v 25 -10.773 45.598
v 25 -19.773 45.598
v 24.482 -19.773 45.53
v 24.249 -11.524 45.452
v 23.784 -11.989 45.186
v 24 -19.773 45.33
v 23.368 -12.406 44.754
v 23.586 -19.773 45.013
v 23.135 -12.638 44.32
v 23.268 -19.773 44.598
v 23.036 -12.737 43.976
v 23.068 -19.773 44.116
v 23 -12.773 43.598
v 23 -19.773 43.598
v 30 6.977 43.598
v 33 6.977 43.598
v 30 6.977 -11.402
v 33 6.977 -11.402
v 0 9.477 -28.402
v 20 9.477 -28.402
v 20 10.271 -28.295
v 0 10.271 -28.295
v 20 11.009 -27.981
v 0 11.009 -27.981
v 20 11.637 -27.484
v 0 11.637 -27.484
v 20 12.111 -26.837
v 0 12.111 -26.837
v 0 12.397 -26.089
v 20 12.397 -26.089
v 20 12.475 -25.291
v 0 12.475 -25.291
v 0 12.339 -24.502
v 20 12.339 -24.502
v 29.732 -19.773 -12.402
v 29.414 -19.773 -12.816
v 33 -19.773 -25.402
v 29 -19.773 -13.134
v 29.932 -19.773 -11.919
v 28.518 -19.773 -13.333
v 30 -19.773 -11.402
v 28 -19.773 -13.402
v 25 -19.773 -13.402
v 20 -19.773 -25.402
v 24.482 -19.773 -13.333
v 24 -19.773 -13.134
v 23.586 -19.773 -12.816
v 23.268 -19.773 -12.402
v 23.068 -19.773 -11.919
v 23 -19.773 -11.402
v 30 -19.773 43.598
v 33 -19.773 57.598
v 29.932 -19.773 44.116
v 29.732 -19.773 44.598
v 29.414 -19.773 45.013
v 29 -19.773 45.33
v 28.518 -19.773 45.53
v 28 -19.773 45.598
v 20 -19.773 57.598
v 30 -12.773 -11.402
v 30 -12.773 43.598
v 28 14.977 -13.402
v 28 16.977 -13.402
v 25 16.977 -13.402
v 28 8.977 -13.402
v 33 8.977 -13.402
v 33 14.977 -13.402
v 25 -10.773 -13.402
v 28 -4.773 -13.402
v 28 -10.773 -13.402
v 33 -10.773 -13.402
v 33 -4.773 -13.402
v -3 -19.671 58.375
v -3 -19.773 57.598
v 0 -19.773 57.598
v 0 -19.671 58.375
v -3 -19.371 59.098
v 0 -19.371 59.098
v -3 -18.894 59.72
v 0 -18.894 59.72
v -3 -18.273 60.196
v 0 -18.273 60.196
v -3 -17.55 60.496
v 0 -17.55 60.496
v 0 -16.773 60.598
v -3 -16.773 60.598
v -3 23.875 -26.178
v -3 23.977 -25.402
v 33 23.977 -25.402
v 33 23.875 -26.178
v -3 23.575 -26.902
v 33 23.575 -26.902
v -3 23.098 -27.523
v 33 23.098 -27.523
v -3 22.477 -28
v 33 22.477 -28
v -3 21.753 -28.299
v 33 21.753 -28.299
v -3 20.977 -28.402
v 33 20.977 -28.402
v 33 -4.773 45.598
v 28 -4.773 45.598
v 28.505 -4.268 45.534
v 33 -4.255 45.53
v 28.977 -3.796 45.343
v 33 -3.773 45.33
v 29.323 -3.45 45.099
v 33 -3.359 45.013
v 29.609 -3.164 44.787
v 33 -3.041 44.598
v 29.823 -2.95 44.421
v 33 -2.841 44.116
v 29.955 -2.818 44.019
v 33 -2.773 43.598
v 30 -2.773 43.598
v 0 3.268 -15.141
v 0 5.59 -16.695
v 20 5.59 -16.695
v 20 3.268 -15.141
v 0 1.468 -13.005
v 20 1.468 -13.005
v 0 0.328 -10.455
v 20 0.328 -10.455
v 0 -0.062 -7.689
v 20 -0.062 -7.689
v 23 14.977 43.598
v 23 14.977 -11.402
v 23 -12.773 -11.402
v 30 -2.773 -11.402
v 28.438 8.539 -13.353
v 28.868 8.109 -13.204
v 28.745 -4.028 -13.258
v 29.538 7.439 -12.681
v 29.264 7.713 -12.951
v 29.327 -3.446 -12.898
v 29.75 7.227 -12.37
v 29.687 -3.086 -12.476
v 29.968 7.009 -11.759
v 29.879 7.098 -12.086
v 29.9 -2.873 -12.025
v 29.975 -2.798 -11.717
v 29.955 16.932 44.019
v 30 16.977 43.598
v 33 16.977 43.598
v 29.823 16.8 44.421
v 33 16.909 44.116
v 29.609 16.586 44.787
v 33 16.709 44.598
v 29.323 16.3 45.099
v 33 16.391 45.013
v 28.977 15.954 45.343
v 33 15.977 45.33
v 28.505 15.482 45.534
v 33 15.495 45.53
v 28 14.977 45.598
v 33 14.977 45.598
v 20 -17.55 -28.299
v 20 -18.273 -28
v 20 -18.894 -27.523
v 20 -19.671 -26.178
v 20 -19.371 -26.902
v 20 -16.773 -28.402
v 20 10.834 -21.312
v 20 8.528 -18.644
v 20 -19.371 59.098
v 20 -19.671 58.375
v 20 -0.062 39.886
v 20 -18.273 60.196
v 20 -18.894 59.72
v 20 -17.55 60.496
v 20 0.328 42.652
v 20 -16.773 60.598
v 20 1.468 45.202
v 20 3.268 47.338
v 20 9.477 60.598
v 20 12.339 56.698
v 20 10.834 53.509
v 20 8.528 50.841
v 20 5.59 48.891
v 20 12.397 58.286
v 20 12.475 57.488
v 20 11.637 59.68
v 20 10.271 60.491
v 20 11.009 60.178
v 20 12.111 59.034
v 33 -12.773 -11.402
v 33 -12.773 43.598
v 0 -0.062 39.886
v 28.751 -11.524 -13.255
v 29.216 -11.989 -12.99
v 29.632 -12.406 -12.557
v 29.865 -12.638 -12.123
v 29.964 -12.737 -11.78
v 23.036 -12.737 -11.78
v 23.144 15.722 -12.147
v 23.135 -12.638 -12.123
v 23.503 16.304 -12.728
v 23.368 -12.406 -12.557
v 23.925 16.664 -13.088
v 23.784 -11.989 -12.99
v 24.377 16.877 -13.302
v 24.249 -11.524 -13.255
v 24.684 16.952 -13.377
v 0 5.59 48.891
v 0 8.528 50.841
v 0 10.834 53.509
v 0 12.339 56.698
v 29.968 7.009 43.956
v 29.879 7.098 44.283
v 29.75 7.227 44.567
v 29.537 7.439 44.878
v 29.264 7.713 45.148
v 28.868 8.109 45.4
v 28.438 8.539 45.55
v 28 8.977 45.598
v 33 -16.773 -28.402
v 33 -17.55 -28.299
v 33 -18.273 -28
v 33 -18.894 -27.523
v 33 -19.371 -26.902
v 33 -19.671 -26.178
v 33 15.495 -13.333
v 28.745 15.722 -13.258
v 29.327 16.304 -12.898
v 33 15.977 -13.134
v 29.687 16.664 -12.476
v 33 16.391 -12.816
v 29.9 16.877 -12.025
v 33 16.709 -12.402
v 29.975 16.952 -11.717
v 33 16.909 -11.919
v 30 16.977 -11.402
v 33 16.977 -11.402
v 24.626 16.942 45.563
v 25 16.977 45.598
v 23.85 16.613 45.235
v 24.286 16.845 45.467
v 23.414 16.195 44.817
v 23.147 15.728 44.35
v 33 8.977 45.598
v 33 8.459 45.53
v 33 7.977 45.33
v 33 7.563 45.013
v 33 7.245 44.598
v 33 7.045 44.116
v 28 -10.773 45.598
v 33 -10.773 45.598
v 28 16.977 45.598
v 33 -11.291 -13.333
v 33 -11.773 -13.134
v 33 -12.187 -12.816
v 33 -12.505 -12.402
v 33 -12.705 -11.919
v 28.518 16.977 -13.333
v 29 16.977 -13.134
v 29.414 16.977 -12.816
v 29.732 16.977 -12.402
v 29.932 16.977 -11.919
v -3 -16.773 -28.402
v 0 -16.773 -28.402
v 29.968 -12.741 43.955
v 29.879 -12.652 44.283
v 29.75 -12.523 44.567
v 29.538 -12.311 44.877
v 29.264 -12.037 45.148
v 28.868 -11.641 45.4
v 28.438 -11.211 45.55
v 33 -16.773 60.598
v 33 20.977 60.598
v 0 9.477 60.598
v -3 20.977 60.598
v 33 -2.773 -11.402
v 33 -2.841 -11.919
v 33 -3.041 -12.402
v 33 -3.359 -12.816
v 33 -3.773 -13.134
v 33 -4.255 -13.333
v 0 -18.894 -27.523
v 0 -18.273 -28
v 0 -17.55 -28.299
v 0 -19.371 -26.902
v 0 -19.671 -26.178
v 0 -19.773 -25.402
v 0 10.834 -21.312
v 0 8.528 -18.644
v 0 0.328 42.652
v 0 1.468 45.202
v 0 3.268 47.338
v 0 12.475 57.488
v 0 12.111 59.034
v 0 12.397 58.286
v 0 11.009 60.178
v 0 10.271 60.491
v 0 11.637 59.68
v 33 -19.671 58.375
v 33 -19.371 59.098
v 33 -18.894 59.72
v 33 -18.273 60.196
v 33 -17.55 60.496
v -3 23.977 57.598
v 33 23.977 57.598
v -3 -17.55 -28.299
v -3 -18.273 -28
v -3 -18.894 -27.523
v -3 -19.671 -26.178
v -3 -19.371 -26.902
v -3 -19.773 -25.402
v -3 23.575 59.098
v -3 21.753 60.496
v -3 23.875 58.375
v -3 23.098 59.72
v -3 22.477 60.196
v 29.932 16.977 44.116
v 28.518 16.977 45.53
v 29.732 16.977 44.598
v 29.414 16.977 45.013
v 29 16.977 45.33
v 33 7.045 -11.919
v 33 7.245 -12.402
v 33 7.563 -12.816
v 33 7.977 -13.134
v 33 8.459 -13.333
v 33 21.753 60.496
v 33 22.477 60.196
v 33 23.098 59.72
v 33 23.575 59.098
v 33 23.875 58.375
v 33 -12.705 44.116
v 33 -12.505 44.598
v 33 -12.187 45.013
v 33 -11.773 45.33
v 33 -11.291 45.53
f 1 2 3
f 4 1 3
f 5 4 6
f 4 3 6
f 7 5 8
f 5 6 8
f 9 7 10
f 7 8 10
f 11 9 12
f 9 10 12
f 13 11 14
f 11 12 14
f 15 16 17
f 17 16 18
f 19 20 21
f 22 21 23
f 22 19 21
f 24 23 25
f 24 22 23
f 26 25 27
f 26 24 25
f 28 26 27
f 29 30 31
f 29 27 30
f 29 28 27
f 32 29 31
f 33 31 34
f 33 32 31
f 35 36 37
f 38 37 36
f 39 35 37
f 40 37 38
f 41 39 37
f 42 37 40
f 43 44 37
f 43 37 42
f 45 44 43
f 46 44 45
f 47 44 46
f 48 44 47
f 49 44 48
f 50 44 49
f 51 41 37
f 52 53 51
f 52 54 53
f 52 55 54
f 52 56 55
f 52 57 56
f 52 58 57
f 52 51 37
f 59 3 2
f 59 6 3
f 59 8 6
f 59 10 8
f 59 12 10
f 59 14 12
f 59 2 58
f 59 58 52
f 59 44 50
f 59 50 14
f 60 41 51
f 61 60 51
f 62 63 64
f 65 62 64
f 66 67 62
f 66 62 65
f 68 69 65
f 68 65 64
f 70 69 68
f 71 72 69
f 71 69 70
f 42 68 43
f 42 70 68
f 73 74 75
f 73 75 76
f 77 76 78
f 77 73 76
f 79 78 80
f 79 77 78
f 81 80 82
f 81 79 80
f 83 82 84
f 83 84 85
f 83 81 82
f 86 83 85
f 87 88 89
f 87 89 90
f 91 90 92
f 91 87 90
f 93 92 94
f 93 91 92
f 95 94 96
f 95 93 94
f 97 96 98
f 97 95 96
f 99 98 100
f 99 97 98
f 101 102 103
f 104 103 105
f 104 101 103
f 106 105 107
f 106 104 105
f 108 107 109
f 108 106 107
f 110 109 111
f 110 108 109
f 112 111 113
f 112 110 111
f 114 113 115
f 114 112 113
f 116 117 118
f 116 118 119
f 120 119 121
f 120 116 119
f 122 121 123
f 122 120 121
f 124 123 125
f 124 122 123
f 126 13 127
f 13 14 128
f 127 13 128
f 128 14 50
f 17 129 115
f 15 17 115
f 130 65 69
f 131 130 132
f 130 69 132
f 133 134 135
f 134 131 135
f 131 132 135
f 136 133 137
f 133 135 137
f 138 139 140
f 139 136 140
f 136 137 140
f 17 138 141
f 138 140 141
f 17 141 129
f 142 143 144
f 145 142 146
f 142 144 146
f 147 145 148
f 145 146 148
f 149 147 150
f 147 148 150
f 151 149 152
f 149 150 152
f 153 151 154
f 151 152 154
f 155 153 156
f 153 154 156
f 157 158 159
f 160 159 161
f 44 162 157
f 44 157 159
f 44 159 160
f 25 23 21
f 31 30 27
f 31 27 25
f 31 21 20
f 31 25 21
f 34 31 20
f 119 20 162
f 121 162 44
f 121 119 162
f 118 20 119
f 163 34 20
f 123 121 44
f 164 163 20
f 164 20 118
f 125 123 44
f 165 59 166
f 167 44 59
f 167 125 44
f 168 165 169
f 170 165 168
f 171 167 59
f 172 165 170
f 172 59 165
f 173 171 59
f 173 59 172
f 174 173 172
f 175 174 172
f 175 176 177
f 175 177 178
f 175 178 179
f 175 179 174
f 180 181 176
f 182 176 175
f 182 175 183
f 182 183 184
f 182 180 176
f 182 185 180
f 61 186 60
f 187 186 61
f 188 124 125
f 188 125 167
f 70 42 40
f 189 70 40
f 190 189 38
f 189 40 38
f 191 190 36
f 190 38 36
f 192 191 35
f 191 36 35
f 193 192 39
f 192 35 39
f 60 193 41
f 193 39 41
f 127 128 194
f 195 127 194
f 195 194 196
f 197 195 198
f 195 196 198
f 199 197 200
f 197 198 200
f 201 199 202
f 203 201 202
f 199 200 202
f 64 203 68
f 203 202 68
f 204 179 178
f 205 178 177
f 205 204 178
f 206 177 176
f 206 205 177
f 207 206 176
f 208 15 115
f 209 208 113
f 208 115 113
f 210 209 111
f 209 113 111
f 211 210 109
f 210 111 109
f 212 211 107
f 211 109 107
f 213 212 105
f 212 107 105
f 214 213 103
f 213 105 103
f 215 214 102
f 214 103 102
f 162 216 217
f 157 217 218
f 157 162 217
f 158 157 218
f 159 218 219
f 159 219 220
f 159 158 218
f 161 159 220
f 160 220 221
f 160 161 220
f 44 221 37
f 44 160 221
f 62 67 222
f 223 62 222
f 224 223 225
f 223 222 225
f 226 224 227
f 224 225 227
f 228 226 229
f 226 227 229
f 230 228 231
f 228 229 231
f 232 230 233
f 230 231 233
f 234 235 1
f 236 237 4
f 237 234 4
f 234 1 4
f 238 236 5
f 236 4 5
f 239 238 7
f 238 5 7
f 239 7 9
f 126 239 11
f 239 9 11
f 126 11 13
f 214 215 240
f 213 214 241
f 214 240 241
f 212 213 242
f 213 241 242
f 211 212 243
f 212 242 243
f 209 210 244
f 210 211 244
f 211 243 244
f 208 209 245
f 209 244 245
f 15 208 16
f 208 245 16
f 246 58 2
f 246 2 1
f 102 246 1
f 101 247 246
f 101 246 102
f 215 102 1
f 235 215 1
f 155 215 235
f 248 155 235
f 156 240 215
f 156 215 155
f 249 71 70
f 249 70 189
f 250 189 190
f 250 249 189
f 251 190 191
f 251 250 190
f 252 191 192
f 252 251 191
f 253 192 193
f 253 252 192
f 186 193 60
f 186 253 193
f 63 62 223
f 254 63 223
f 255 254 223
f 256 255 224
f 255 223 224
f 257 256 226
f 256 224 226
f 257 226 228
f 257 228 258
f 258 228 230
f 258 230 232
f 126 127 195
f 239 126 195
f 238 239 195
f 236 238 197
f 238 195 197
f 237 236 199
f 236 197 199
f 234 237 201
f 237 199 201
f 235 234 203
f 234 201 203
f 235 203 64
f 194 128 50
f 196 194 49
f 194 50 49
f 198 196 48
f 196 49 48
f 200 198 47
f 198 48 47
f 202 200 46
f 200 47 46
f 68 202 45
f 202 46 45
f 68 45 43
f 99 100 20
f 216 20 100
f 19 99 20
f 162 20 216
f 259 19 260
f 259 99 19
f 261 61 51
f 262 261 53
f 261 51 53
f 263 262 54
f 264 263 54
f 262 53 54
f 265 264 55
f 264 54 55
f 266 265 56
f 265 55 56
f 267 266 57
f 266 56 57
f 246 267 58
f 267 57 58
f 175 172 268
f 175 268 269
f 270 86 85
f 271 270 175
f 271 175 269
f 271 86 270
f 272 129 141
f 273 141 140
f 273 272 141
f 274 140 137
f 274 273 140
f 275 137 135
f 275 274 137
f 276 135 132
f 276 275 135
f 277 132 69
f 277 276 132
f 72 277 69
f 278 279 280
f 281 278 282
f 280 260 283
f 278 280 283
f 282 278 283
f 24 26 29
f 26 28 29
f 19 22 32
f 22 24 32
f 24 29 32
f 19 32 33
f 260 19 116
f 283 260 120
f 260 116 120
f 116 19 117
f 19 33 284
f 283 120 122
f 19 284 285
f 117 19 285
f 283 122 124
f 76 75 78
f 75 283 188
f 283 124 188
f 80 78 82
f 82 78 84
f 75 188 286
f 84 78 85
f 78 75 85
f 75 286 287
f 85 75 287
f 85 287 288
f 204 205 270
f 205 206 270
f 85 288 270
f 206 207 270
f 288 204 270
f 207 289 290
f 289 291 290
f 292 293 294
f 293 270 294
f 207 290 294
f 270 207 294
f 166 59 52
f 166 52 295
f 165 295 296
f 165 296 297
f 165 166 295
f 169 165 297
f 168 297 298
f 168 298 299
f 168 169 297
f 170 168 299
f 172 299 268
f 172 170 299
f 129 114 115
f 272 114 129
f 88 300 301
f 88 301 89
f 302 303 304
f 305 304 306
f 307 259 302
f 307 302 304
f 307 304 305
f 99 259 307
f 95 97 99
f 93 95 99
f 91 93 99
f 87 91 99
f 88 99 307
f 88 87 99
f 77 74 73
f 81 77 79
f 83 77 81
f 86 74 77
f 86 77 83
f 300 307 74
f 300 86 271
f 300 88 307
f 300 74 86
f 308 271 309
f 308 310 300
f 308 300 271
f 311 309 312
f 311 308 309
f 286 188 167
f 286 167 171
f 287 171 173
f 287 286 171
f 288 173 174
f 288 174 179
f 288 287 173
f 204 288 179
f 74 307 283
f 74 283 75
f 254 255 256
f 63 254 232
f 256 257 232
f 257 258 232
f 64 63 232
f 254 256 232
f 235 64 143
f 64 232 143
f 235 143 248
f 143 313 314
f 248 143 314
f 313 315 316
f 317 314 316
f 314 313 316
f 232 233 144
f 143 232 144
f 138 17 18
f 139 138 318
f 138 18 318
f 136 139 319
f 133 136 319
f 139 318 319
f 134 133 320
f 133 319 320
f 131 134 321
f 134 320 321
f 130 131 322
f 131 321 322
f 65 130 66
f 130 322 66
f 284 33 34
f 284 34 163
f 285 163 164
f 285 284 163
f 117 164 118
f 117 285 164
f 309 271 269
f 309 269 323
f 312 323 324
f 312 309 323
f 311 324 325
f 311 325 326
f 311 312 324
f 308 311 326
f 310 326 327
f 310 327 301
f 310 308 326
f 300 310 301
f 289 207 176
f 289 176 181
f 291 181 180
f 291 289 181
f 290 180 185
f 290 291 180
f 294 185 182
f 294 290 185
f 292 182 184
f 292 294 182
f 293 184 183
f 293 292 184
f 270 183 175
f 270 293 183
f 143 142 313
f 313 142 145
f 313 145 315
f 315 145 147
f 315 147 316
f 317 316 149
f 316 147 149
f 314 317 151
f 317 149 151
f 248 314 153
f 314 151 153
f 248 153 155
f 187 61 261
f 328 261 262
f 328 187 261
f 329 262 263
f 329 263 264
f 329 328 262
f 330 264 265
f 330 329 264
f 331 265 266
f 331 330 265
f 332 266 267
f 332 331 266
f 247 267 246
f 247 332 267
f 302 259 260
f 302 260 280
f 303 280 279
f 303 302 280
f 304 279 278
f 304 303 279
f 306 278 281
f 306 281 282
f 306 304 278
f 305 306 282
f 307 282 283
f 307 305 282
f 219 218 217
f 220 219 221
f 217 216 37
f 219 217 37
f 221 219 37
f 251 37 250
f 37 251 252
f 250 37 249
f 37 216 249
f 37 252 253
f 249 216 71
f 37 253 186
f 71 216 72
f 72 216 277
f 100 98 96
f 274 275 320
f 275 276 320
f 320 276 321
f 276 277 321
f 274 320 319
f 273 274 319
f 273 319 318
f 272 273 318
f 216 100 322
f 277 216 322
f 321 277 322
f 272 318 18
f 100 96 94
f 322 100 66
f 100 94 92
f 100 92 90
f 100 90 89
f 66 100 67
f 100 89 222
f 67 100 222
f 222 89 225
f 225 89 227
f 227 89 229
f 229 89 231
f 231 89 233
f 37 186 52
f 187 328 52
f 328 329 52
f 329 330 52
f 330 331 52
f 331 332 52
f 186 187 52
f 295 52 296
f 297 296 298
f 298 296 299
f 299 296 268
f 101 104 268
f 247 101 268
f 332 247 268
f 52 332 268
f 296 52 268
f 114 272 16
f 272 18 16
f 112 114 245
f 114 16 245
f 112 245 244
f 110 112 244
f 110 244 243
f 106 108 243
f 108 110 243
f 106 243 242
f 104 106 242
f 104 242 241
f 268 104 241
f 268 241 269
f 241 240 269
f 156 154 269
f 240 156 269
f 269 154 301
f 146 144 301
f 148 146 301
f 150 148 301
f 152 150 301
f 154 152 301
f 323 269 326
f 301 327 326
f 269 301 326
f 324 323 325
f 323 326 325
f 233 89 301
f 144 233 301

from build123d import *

# Parameters (mm, degrees)
RESSALTO_EXTRUS_O2_DEPTH      = 30
RESSALTO_EXTRUS_O3_START      = 3
RESSALTO_EXTRUS_O3_DEPTH      = 3
RESSALTO_EXTRUS_O4_DEPTH      = 3
RESSALTO_EXTRUS_O4_DEPTH_BACK = 10
CORTE_EXTRUS_O1_DEPTH         = 10
CORTE_EXTRUS_O2_REACH         = 83.702
FILETE1_START                 = -19.773073923
FILETE1_DEPTH                 = 36.75
FILETE1_START_2               = -13.40159992
FILETE1_2_DEPTH               = 59


with BuildPart() as part:
    # Esboço2 → Ressalto-extrusão2 (new body)
    with BuildSketch(Plane(origin=(0, 0, 0), x_dir=(0, 0, -1), z_dir=(1, 0, 0))):
        with BuildLine():
            Line((2.90159992, -0.062465938), (-35.09840008, -0.062465938))
            Line((-35.09840008, -0.062465938), (-39.886084903, -0.062465938))
            ThreePointArc((-39.886084903, -0.062465938), (-45.202180234, 1.467638524), (-48.891439328, 5.589707975))
            ThreePointArc((-48.891439328, 5.589707975), (-52.096536948, 9.772081499), (-56.69840008, 12.338743681))
            ThreePointArc((-56.69840008, 12.338743681), (-59.373224015, 11.895603401), (-60.59840008, 9.476926077))
            Line((-60.59840008, 9.476926077), (-60.59840008, 20.976926077))
            ThreePointArc((-60.59840008, 20.976926077), (-59.719720424, 23.09824642), (-57.59840008, 23.976926077))
            Line((-57.59840008, 23.976926077), (25.40159992, 23.976926077))
            ThreePointArc((25.40159992, 23.976926077), (27.522920263, 23.09824642), (28.40159992, 20.976926077))
            Line((28.40159992, 20.976926077), (28.40159992, 9.476926077))
            ThreePointArc((28.40159992, 9.476926077), (27.176423855, 11.895603401), (24.50159992, 12.338743681))
            ThreePointArc((24.50159992, 12.338743681), (19.899736788, 9.772081499), (16.694639168, 5.589707975))
            ThreePointArc((16.694639168, 5.589707975), (13.005380073, 1.467638524), (7.689284743, -0.062465938))
            Line((7.689284743, -0.062465938), (2.90159992, -0.062465938))
        make_face()
    extrude(amount=RESSALTO_EXTRUS_O2_DEPTH)

    # Esboço3 → Ressalto-extrusão3 (add)
    with BuildSketch(Plane.ZY.offset(RESSALTO_EXTRUS_O3_START)):
        with BuildLine():
            Line((60.59840008, 15.226926077), (60.59840008, 20.976926077))
            ThreePointArc((60.59840008, 20.976926077), (59.719720424, 23.09824642), (57.59840008, 23.976926077))
            Line((57.59840008, 23.976926077), (16.09840008, 23.976926077))
            Line((16.09840008, 23.976926077), (-25.40159992, 23.976926077))
            ThreePointArc((-25.40159992, 23.976926077), (-27.522920263, 23.09824642), (-28.40159992, 20.976926077))
            Line((-28.40159992, 20.976926077), (-28.40159992, 15.226926077))
            Line((-28.40159992, 15.226926077), (-28.40159992, -16.773073923))
            ThreePointArc((-28.40159992, -16.773073923), (-27.522920263, -18.894394267), (-25.40159992, -19.773073923))
            Line((-25.40159992, -19.773073923), (57.59840008, -19.773073923))
            ThreePointArc((57.59840008, -19.773073923), (59.719720424, -18.894394267), (60.59840008, -16.773073923))
            Line((60.59840008, -16.773073923), (60.59840008, 15.226926077))
        make_face()
    extrude(amount=-RESSALTO_EXTRUS_O3_DEPTH)

    # Esboço4 → Ressalto-extrusão4 (add, two sides: drawn at the far end of the back side and taken through both)
    with BuildSketch(Plane(origin=(30, 0, 0), x_dir=(0, 0, -1), z_dir=(1, 0, 0)).offset(-RESSALTO_EXTRUS_O4_DEPTH_BACK)):
        with BuildLine():
            Line((-16.09840008, 23.976926077), (25.40159992, 23.976926077))
            ThreePointArc((25.40159992, 23.976926077), (27.522920263, 23.09824642), (28.40159992, 20.976926077))
            Line((28.40159992, 20.976926077), (28.40159992, 15.226926077))
            Line((28.40159992, 15.226926077), (28.40159992, -16.773073923))
            ThreePointArc((28.40159992, -16.773073923), (27.522920263, -18.894394267), (25.40159992, -19.773073923))
            Line((25.40159992, -19.773073923), (-57.59840008, -19.773073923))
            ThreePointArc((-57.59840008, -19.773073923), (-59.719720424, -18.894394267), (-60.59840008, -16.773073923))
            Line((-60.59840008, -16.773073923), (-60.59840008, 15.226926077))
            Line((-60.59840008, 15.226926077), (-60.59840008, 20.976926077))
            ThreePointArc((-60.59840008, 20.976926077), (-59.719720424, 23.09824642), (-57.59840008, 23.976926077))
            Line((-57.59840008, 23.976926077), (-16.09840008, 23.976926077))
        make_face()
    extrude(amount=RESSALTO_EXTRUS_O4_DEPTH + RESSALTO_EXTRUS_O4_DEPTH_BACK)

    # Esboço8 → Corte-extrusão1 (cut)
    with BuildSketch(Plane(origin=(33, 0, 0), x_dir=(0, 0, -1), z_dir=(1, 0, 0))):
        with BuildLine():
            Line((-43.59840008, -2.773073923), (11.40159992, -2.773073923))
            ThreePointArc((11.40159992, -2.773073923), (12.815813482, -3.358860361), (13.40159992, -4.773073923))
            Line((13.40159992, -4.773073923), (13.40159992, -10.773073923))
            ThreePointArc((13.40159992, -10.773073923), (12.815813482, -12.187287486), (11.40159992, -12.773073923))
            Line((11.40159992, -12.773073923), (-43.59840008, -12.773073923))
            ThreePointArc((-43.59840008, -12.773073923), (-45.012613643, -12.187287486), (-45.59840008, -10.773073923))
            Line((-45.59840008, -10.773073923), (-45.59840008, -4.773073923))
            ThreePointArc((-45.59840008, -4.773073923), (-45.012613643, -3.358860361), (-43.59840008, -2.773073923))
        make_face()
        with BuildLine():
            Line((-43.59840008, 6.976926077), (11.40159992, 6.976926077))
            ThreePointArc((11.40159992, 6.976926077), (12.815813482, 7.562712514), (13.40159992, 8.976926077))
            Line((13.40159992, 8.976926077), (13.40159992, 14.976926077))
            ThreePointArc((13.40159992, 14.976926077), (12.815813482, 16.391139639), (11.40159992, 16.976926077))
            Line((11.40159992, 16.976926077), (-43.59840008, 16.976926077))
            ThreePointArc((-43.59840008, 16.976926077), (-45.012613643, 16.391139639), (-45.59840008, 14.976926077))
            Line((-45.59840008, 14.976926077), (-45.59840008, 8.976926077))
            ThreePointArc((-45.59840008, 8.976926077), (-45.012613643, 7.562712514), (-43.59840008, 6.976926077))
        make_face()
    extrude(amount=-CORTE_EXTRUS_O1_DEPTH, mode=Mode.SUBTRACT)

    # Corte-extrusão2: up to this face of the body (flat: up to its plane)
    corte_extrus_o2_end = Plane(part.part.faces().sort_by_distance((28, 16.976926077, 16.09840008))[0])
    # Esboço9 → Corte-extrusão2 (cut, up to the picked face)
    with BuildSketch(Plane(origin=(0, -19.773073923, 0), x_dir=(-1, 0, 0), z_dir=(0, -1, 0)), mode=Mode.PRIVATE) as corte_extrus_o2_sk1:
        with BuildLine():
            Line((-25, 13.40159992), (-28, 13.40159992))
            ThreePointArc((-28, 13.40159992), (-29.414213562, 12.815813482), (-30, 11.40159992))
            Line((-30, 11.40159992), (-30, -43.59840008))
            ThreePointArc((-30, -43.59840008), (-29.414213562, -45.012613643), (-28, -45.59840008))
            Line((-28, -45.59840008), (-25, -45.59840008))
            ThreePointArc((-25, -45.59840008), (-23.585786438, -45.012613643), (-23, -43.59840008))
            Line((-23, -43.59840008), (-23, 11.40159992))
            ThreePointArc((-23, 11.40159992), (-23.585786438, 12.815813482), (-25, 13.40159992))
        make_face()
    corte_extrus_o2_tool1 = split(extrude(corte_extrus_o2_sk1.sketch, amount=-CORTE_EXTRUS_O2_REACH, mode=Mode.PRIVATE), bisect_by=corte_extrus_o2_end, keep=Keep.BOTH, mode=Mode.PRIVATE)
    add(corte_extrus_o2_tool1.solids().sort_by(Axis((26.5, -19.773074, 16.0984), (0, 1, 0)))[0], mode=Mode.SUBTRACT)

    # Filete1: read off the stored shape, not the designer's step
    # Filete1 outline → Filete1 (add)
    with BuildSketch(Plane(origin=(0, 0, 0), x_dir=(1, 0, 0), z_dir=(0, 1, 0)).offset(FILETE1_START)):
        with BuildLine():
            ThreePointArc((25, -45.59840008), (23.585786437, -45.012613642), (23, -43.59840008))
            Line((23, -43.59840008), (23, -45.59840008))
            Line((23, -45.59840008), (25, -45.59840008))
        make_face()
        with BuildLine():
            ThreePointArc((23, 11.40159992), (23.585786438, 12.815813482), (25, 13.40159992))
            Line((25, 13.40159992), (23, 13.40159992))
            Line((23, 13.40159992), (23, 11.40159992))
        make_face()
    extrude(amount=FILETE1_DEPTH)

    # Filete1 2 outline → Filete1 2 (add)
    with BuildSketch(Plane.XY.offset(FILETE1_START_2)):
        with BuildLine():
            ThreePointArc((23, 14.976926077), (23.585786438, 16.391139639), (25, 16.976926077))
            Line((25, 16.976926077), (23, 16.976926077))
            Line((23, 16.976926077), (23, 14.976926077))
        make_face()
    extrude(amount=FILETE1_2_DEPTH)


solid = part.part
